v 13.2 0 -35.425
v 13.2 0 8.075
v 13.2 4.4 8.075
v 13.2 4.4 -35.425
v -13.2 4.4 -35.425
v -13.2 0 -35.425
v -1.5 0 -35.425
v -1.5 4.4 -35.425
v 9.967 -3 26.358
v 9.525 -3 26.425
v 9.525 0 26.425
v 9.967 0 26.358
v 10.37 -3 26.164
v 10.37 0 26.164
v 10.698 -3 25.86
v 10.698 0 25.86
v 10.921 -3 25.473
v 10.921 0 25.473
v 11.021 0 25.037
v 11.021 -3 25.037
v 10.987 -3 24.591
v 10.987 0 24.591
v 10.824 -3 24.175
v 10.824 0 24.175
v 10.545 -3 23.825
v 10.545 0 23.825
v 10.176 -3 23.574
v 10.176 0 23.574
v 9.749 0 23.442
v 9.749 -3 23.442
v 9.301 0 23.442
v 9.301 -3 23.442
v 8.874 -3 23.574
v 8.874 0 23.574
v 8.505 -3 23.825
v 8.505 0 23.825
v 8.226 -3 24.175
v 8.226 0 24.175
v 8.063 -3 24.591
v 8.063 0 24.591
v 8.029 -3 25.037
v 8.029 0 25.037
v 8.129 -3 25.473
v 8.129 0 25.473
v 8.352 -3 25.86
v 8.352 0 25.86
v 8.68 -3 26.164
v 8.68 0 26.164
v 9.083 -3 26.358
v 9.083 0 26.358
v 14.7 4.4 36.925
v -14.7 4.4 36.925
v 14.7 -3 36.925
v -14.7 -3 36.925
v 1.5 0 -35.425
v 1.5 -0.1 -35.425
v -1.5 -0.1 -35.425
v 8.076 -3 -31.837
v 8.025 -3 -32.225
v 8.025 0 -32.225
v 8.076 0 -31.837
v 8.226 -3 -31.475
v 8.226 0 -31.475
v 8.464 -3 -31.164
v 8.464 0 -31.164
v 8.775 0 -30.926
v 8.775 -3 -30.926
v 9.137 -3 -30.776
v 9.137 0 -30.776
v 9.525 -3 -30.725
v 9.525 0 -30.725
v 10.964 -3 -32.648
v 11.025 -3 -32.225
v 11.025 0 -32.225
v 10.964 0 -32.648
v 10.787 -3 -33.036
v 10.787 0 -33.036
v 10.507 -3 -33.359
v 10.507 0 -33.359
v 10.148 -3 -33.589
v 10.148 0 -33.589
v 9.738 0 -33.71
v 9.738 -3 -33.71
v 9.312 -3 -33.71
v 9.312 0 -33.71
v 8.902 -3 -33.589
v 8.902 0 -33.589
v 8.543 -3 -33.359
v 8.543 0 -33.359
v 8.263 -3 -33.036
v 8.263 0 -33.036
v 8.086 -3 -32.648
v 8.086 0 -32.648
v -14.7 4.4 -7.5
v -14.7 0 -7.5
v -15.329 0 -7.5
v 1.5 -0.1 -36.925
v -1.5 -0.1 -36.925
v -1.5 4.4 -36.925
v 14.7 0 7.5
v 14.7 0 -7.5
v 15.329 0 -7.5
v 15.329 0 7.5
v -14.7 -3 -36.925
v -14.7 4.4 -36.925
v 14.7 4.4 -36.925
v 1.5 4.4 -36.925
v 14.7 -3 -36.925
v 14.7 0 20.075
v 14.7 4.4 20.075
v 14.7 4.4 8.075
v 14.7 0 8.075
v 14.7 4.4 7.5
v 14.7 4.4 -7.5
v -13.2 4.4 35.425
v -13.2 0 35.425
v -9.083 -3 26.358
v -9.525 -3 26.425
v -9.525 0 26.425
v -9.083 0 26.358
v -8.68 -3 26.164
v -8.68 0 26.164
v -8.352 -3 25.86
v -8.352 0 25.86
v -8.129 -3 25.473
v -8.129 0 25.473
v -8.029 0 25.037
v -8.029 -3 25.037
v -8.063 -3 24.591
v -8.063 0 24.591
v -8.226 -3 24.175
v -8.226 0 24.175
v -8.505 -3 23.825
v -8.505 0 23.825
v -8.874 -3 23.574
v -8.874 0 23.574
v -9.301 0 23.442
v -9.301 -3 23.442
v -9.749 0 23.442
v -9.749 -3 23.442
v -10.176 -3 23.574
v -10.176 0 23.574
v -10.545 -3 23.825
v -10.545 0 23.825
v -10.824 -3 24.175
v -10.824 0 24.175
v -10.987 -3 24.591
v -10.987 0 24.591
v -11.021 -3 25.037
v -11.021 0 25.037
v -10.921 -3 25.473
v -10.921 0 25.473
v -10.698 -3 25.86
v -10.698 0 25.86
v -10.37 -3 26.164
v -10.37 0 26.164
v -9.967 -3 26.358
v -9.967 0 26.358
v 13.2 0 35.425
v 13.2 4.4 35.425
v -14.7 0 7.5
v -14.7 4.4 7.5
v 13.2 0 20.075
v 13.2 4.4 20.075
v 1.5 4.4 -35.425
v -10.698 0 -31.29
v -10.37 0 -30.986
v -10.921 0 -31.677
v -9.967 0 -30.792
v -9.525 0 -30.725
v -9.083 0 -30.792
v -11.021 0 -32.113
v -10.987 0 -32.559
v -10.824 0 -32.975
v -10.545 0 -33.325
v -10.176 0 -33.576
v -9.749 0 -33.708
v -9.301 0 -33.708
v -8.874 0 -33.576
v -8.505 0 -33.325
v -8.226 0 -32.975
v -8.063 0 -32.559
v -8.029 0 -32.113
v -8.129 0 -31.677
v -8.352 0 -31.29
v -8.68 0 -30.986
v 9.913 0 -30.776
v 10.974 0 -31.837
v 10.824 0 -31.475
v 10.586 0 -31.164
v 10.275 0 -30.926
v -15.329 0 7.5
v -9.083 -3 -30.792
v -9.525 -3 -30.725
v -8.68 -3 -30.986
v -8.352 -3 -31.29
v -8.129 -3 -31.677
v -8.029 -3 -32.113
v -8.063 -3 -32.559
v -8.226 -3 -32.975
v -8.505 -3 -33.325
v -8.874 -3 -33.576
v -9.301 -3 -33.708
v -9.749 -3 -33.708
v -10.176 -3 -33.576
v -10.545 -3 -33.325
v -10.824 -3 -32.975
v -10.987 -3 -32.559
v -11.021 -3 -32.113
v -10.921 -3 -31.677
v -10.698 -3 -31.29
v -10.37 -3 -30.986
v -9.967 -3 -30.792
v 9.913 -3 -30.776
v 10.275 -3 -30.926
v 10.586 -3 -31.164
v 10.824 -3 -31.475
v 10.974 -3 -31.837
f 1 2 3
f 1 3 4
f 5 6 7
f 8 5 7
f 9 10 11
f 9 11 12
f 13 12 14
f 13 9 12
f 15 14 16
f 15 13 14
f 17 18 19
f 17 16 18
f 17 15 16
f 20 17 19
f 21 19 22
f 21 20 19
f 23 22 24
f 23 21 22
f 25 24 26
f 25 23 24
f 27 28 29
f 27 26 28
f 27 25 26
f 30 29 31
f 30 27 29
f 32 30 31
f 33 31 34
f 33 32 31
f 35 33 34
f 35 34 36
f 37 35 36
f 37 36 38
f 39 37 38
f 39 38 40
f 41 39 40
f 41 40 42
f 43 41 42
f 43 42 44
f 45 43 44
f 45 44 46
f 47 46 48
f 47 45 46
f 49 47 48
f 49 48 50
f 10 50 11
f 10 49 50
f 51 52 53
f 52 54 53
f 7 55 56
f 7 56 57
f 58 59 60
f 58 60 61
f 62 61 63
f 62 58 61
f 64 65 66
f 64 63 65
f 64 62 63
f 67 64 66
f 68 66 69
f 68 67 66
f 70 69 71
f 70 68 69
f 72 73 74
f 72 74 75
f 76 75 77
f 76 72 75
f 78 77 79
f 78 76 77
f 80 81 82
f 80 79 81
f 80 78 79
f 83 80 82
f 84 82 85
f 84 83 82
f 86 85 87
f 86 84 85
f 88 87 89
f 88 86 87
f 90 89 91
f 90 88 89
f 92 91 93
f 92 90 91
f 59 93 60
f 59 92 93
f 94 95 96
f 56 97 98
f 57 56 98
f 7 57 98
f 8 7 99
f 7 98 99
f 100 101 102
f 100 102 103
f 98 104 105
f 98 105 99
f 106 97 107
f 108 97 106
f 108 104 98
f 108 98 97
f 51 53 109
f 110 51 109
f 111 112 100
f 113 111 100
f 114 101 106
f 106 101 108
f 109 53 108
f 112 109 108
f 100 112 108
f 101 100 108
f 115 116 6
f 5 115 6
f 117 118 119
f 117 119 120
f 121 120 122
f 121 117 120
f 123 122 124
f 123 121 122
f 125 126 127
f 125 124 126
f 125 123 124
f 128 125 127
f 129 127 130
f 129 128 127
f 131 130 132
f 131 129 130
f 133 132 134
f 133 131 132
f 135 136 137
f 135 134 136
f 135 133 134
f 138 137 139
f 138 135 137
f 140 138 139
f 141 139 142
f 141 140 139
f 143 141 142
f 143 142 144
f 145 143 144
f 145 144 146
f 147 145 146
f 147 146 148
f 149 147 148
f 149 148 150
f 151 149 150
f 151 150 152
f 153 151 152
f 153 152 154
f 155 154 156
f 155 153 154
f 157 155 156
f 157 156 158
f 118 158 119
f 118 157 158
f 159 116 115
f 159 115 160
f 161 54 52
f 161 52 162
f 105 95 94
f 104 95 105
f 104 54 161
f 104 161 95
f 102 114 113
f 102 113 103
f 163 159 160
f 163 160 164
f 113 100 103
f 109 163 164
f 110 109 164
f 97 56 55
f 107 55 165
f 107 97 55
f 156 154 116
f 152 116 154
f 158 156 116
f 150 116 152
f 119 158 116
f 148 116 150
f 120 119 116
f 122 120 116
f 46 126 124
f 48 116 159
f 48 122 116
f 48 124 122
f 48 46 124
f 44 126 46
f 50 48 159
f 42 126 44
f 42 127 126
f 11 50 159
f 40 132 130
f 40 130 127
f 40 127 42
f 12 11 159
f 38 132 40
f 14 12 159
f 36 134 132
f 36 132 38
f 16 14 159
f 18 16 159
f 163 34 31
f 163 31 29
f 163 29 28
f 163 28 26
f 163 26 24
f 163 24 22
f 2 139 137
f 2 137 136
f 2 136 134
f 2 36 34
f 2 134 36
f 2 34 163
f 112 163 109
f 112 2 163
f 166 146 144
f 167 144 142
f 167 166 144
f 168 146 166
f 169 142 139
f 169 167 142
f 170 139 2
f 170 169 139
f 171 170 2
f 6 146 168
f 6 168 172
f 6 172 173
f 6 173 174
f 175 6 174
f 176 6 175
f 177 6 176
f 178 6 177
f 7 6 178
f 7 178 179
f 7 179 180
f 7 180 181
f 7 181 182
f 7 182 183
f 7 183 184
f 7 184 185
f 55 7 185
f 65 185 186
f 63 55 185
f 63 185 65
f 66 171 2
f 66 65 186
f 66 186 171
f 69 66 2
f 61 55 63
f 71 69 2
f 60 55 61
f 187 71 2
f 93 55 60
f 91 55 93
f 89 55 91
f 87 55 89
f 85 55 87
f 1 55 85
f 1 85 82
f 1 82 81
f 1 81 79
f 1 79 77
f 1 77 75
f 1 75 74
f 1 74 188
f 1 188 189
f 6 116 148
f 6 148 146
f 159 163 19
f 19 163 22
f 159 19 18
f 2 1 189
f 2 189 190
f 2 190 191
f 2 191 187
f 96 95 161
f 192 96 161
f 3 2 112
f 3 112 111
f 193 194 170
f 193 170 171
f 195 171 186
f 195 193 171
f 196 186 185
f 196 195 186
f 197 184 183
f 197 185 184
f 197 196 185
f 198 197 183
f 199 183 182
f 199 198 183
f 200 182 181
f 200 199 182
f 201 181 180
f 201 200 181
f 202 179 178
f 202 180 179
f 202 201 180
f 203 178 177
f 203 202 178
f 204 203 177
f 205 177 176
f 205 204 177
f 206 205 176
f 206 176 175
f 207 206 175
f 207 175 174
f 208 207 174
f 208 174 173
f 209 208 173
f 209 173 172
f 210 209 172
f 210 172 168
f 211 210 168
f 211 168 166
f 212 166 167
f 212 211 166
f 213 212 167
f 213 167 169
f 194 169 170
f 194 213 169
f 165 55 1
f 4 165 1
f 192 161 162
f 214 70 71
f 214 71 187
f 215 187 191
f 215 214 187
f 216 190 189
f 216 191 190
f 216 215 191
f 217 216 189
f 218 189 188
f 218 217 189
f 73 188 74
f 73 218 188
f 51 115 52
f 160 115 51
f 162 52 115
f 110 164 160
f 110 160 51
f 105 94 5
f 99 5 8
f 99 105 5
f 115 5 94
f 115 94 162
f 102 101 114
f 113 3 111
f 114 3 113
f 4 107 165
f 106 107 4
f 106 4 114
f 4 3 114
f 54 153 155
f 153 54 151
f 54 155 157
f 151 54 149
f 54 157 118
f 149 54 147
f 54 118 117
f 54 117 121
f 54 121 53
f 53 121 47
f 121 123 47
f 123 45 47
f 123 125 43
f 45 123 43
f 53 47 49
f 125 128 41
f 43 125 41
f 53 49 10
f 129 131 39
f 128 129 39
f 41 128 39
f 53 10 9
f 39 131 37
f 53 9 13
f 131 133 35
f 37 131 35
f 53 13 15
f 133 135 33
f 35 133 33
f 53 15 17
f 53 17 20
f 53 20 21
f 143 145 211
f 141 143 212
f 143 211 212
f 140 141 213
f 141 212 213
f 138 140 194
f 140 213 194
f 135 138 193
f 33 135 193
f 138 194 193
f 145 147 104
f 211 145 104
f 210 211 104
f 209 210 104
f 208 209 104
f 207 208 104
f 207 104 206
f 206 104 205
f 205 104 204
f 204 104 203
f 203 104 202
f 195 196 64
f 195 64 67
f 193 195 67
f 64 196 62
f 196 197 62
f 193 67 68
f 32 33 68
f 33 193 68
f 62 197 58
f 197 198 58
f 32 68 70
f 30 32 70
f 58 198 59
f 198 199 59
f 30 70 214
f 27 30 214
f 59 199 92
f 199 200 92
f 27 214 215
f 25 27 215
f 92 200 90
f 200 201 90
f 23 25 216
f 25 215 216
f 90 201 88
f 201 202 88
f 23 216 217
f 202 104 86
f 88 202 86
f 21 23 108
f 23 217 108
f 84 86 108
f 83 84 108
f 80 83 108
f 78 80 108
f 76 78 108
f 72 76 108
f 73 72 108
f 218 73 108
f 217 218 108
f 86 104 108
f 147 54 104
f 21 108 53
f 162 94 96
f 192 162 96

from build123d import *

# Parameters (mm, degrees)
SKETCH1_W               = 29.4
SKETCH1_H               = 73.85
SKETCH1_W_2             = 26.4
SKETCH1_H_2             = 70.85
SKETCH1_W_3             = 25.4
SKETCH1_H_3             = 69.85
BOSS_EXTRUDE1_DEPTH     = 3
SKETCH1_3_W             = 29.4
SKETCH1_3_H             = 73.85
SKETCH1_3_W_2           = 26.4
SKETCH1_3_H_2           = 70.85
BOSS_EXTRUDE2_DEPTH     = 4.4
CUT_EXTRUDE1_DEPTH      = 40.986317973
CUT_EXTRUDE1_DEPTH_BACK = 40.986317973
SKETCH2_R               = 1.5
SKETCH3_W               = 3
SKETCH3_H               = 4.5
CUT_EXTRUDE2_DEPTH      = 1.5
SKETCH4_W               = 12
SKETCH4_H               = 4.4
CUT_EXTRUDE3_DEPTH      = 1.5
SKETCH5_W               = 15
SKETCH5_H               = 4.4
BOSS_EXTRUDE3_DEPTH     = 1
CHAMFER1_SIZE           = 1
CHAMFER1_SIZE_2         = 7
CHAMFER2_SIZE           = 1
CHAMFER2_SIZE_2         = 7


with BuildPart() as part:
    # Sketch1 → Boss-Extrude1 (new body)
    # profile 1 of 3: a face of its own
    with BuildSketch(Plane(origin=(0, 0, 0), x_dir=(1, 0, 0), z_dir=(0, 1, 0))):
        Rectangle(SKETCH1_W, SKETCH1_H)
        Rectangle(SKETCH1_W_2, SKETCH1_H_2, mode=Mode.SUBTRACT)
    # profile 2 of 3: a face of its own
    with BuildSketch(Plane(origin=(0, 0, 0), x_dir=(1, 0, 0), z_dir=(0, 1, 0))):
        Rectangle(SKETCH1_W_2, SKETCH1_H_2)
        Rectangle(SKETCH1_W_3, SKETCH1_H_3, mode=Mode.SUBTRACT)
    # profile 3 of 3: a face of its own
    with BuildSketch(Plane(origin=(0, 0, 0), x_dir=(1, 0, 0), z_dir=(0, 1, 0))):
        Rectangle(SKETCH1_W_3, SKETCH1_H_3)
    extrude(amount=-BOSS_EXTRUDE1_DEPTH)

    # Sketch1<3> → Boss-Extrude2 (add)
    with BuildSketch(Plane(origin=(0, 0, 0), x_dir=(1, 0, 0), z_dir=(0, 1, 0))):
        Rectangle(SKETCH1_3_W, SKETCH1_3_H)
        Rectangle(SKETCH1_3_W_2, SKETCH1_3_H_2, mode=Mode.SUBTRACT)
    extrude(amount=BOSS_EXTRUDE2_DEPTH)

    # Sketch2 → Cut-Extrude1 (cut, two sides: drawn at the far end of the back side and taken through both)
    with BuildSketch(Plane(origin=(0, 0, 0), x_dir=(1, 0, 0), z_dir=(0, 1, 0)).offset(-CUT_EXTRUDE1_DEPTH_BACK)):
        with BuildLine():
            ThreePointArc((11.025, 32.225), (9.525, 33.725), (8.025, 32.225))
            Line((8.025, 32.225), (9.525, 32.225))
            Line((9.525, 32.225), (9.525, 30.725))
            ThreePointArc((9.525, 30.725), (10.585660172, 31.164339828), (11.025, 32.225))
        make_face()
        with BuildLine():
            Line((9.525, 32.225), (8.025, 32.225))
            ThreePointArc((8.025, 32.225), (8.464339828, 31.164339828), (9.525, 30.725))
            Line((9.525, 30.725), (9.525, 32.225))
        make_face()
        with Locations(Location((-9.525, 32.225, 0), (0, 0, 270))):
            Circle(SKETCH2_R)
        with Locations(Location((-9.525, -24.925, 0), (0, 0, 270))):
            Circle(SKETCH2_R)
        with Locations(Location((9.525, -24.925, 0), (0, 0, 270))):
            Circle(SKETCH2_R)
    extrude(amount=CUT_EXTRUDE1_DEPTH + CUT_EXTRUDE1_DEPTH_BACK, mode=Mode.SUBTRACT)

    # Sketch3 → Cut-Extrude2 (cut)
    with BuildSketch(Plane(origin=(0, 0, -36.925), x_dir=(-1, 0, 0), z_dir=(0, 0, -1))):
        with Locations((0, 2.15)):
            Rectangle(SKETCH3_W, SKETCH3_H)
    extrude(amount=-CUT_EXTRUDE2_DEPTH, mode=Mode.SUBTRACT)

    # Sketch4 → Cut-Extrude3 (cut)
    with BuildSketch(Plane.ZY.offset(-13.2)):
        with Locations((14.075, 2.2)):
            Rectangle(SKETCH4_W, SKETCH4_H)
    extrude(amount=-CUT_EXTRUDE3_DEPTH, mode=Mode.SUBTRACT)

    # Sketch5 → Boss-Extrude3 (add)
    with BuildSketch(Plane.ZY.offset(14.7)):
        with Locations((0, 2.2)):
            Rectangle(SKETCH5_W, SKETCH5_H)
    boss_extrude3 = extrude(amount=BOSS_EXTRUDE3_DEPTH)

    # Chamfer1
    # the kernel refuses this chamfer: 7, 1 mm, written as the material it takes off along each edge
    with BuildSketch(Plane(origin=(-15.7, 4.4, -25.693233978), x_dir=(0.9662442572155542, 0.2576277069687226, 0), z_dir=(0, 0, 1))) as chamfer1_piece_1:
        Polygon((CHAMFER1_SIZE * 0.966244257216, -CHAMFER1_SIZE * 0.257627706969), (-CHAMFER1_SIZE_2 * 0.257627706969, -CHAMFER1_SIZE_2 * 0.966244257216), (0, 0), align=None)
    extrude(amount=51.386467957, mode=Mode.SUBTRACT)

    # Mirror1: Boss-Extrude3 across plane
    add(boss_extrude3.mirror(Plane(origin=(0, 0, 0), x_dir=(0, 0, 1), z_dir=(1, 0, 0))))

    # Chamfer2
    # the kernel refuses this chamfer: 7, 1 mm, written as the material it takes off along each edge
    with BuildSketch(Plane(origin=(15.7, 4.4, -25.693233978), x_dir=(-0.9662442572155542, 0.2576277069687226, 0), z_dir=(0, 0, 1))) as chamfer2_piece_1:
        Polygon((CHAMFER2_SIZE * 0.966244257216, CHAMFER2_SIZE * 0.257627706969), (-CHAMFER2_SIZE_2 * 0.257627706969, CHAMFER2_SIZE_2 * 0.966244257216), (0, 0), align=None)
    extrude(amount=51.386467957, mode=Mode.SUBTRACT)


solid = part.part
